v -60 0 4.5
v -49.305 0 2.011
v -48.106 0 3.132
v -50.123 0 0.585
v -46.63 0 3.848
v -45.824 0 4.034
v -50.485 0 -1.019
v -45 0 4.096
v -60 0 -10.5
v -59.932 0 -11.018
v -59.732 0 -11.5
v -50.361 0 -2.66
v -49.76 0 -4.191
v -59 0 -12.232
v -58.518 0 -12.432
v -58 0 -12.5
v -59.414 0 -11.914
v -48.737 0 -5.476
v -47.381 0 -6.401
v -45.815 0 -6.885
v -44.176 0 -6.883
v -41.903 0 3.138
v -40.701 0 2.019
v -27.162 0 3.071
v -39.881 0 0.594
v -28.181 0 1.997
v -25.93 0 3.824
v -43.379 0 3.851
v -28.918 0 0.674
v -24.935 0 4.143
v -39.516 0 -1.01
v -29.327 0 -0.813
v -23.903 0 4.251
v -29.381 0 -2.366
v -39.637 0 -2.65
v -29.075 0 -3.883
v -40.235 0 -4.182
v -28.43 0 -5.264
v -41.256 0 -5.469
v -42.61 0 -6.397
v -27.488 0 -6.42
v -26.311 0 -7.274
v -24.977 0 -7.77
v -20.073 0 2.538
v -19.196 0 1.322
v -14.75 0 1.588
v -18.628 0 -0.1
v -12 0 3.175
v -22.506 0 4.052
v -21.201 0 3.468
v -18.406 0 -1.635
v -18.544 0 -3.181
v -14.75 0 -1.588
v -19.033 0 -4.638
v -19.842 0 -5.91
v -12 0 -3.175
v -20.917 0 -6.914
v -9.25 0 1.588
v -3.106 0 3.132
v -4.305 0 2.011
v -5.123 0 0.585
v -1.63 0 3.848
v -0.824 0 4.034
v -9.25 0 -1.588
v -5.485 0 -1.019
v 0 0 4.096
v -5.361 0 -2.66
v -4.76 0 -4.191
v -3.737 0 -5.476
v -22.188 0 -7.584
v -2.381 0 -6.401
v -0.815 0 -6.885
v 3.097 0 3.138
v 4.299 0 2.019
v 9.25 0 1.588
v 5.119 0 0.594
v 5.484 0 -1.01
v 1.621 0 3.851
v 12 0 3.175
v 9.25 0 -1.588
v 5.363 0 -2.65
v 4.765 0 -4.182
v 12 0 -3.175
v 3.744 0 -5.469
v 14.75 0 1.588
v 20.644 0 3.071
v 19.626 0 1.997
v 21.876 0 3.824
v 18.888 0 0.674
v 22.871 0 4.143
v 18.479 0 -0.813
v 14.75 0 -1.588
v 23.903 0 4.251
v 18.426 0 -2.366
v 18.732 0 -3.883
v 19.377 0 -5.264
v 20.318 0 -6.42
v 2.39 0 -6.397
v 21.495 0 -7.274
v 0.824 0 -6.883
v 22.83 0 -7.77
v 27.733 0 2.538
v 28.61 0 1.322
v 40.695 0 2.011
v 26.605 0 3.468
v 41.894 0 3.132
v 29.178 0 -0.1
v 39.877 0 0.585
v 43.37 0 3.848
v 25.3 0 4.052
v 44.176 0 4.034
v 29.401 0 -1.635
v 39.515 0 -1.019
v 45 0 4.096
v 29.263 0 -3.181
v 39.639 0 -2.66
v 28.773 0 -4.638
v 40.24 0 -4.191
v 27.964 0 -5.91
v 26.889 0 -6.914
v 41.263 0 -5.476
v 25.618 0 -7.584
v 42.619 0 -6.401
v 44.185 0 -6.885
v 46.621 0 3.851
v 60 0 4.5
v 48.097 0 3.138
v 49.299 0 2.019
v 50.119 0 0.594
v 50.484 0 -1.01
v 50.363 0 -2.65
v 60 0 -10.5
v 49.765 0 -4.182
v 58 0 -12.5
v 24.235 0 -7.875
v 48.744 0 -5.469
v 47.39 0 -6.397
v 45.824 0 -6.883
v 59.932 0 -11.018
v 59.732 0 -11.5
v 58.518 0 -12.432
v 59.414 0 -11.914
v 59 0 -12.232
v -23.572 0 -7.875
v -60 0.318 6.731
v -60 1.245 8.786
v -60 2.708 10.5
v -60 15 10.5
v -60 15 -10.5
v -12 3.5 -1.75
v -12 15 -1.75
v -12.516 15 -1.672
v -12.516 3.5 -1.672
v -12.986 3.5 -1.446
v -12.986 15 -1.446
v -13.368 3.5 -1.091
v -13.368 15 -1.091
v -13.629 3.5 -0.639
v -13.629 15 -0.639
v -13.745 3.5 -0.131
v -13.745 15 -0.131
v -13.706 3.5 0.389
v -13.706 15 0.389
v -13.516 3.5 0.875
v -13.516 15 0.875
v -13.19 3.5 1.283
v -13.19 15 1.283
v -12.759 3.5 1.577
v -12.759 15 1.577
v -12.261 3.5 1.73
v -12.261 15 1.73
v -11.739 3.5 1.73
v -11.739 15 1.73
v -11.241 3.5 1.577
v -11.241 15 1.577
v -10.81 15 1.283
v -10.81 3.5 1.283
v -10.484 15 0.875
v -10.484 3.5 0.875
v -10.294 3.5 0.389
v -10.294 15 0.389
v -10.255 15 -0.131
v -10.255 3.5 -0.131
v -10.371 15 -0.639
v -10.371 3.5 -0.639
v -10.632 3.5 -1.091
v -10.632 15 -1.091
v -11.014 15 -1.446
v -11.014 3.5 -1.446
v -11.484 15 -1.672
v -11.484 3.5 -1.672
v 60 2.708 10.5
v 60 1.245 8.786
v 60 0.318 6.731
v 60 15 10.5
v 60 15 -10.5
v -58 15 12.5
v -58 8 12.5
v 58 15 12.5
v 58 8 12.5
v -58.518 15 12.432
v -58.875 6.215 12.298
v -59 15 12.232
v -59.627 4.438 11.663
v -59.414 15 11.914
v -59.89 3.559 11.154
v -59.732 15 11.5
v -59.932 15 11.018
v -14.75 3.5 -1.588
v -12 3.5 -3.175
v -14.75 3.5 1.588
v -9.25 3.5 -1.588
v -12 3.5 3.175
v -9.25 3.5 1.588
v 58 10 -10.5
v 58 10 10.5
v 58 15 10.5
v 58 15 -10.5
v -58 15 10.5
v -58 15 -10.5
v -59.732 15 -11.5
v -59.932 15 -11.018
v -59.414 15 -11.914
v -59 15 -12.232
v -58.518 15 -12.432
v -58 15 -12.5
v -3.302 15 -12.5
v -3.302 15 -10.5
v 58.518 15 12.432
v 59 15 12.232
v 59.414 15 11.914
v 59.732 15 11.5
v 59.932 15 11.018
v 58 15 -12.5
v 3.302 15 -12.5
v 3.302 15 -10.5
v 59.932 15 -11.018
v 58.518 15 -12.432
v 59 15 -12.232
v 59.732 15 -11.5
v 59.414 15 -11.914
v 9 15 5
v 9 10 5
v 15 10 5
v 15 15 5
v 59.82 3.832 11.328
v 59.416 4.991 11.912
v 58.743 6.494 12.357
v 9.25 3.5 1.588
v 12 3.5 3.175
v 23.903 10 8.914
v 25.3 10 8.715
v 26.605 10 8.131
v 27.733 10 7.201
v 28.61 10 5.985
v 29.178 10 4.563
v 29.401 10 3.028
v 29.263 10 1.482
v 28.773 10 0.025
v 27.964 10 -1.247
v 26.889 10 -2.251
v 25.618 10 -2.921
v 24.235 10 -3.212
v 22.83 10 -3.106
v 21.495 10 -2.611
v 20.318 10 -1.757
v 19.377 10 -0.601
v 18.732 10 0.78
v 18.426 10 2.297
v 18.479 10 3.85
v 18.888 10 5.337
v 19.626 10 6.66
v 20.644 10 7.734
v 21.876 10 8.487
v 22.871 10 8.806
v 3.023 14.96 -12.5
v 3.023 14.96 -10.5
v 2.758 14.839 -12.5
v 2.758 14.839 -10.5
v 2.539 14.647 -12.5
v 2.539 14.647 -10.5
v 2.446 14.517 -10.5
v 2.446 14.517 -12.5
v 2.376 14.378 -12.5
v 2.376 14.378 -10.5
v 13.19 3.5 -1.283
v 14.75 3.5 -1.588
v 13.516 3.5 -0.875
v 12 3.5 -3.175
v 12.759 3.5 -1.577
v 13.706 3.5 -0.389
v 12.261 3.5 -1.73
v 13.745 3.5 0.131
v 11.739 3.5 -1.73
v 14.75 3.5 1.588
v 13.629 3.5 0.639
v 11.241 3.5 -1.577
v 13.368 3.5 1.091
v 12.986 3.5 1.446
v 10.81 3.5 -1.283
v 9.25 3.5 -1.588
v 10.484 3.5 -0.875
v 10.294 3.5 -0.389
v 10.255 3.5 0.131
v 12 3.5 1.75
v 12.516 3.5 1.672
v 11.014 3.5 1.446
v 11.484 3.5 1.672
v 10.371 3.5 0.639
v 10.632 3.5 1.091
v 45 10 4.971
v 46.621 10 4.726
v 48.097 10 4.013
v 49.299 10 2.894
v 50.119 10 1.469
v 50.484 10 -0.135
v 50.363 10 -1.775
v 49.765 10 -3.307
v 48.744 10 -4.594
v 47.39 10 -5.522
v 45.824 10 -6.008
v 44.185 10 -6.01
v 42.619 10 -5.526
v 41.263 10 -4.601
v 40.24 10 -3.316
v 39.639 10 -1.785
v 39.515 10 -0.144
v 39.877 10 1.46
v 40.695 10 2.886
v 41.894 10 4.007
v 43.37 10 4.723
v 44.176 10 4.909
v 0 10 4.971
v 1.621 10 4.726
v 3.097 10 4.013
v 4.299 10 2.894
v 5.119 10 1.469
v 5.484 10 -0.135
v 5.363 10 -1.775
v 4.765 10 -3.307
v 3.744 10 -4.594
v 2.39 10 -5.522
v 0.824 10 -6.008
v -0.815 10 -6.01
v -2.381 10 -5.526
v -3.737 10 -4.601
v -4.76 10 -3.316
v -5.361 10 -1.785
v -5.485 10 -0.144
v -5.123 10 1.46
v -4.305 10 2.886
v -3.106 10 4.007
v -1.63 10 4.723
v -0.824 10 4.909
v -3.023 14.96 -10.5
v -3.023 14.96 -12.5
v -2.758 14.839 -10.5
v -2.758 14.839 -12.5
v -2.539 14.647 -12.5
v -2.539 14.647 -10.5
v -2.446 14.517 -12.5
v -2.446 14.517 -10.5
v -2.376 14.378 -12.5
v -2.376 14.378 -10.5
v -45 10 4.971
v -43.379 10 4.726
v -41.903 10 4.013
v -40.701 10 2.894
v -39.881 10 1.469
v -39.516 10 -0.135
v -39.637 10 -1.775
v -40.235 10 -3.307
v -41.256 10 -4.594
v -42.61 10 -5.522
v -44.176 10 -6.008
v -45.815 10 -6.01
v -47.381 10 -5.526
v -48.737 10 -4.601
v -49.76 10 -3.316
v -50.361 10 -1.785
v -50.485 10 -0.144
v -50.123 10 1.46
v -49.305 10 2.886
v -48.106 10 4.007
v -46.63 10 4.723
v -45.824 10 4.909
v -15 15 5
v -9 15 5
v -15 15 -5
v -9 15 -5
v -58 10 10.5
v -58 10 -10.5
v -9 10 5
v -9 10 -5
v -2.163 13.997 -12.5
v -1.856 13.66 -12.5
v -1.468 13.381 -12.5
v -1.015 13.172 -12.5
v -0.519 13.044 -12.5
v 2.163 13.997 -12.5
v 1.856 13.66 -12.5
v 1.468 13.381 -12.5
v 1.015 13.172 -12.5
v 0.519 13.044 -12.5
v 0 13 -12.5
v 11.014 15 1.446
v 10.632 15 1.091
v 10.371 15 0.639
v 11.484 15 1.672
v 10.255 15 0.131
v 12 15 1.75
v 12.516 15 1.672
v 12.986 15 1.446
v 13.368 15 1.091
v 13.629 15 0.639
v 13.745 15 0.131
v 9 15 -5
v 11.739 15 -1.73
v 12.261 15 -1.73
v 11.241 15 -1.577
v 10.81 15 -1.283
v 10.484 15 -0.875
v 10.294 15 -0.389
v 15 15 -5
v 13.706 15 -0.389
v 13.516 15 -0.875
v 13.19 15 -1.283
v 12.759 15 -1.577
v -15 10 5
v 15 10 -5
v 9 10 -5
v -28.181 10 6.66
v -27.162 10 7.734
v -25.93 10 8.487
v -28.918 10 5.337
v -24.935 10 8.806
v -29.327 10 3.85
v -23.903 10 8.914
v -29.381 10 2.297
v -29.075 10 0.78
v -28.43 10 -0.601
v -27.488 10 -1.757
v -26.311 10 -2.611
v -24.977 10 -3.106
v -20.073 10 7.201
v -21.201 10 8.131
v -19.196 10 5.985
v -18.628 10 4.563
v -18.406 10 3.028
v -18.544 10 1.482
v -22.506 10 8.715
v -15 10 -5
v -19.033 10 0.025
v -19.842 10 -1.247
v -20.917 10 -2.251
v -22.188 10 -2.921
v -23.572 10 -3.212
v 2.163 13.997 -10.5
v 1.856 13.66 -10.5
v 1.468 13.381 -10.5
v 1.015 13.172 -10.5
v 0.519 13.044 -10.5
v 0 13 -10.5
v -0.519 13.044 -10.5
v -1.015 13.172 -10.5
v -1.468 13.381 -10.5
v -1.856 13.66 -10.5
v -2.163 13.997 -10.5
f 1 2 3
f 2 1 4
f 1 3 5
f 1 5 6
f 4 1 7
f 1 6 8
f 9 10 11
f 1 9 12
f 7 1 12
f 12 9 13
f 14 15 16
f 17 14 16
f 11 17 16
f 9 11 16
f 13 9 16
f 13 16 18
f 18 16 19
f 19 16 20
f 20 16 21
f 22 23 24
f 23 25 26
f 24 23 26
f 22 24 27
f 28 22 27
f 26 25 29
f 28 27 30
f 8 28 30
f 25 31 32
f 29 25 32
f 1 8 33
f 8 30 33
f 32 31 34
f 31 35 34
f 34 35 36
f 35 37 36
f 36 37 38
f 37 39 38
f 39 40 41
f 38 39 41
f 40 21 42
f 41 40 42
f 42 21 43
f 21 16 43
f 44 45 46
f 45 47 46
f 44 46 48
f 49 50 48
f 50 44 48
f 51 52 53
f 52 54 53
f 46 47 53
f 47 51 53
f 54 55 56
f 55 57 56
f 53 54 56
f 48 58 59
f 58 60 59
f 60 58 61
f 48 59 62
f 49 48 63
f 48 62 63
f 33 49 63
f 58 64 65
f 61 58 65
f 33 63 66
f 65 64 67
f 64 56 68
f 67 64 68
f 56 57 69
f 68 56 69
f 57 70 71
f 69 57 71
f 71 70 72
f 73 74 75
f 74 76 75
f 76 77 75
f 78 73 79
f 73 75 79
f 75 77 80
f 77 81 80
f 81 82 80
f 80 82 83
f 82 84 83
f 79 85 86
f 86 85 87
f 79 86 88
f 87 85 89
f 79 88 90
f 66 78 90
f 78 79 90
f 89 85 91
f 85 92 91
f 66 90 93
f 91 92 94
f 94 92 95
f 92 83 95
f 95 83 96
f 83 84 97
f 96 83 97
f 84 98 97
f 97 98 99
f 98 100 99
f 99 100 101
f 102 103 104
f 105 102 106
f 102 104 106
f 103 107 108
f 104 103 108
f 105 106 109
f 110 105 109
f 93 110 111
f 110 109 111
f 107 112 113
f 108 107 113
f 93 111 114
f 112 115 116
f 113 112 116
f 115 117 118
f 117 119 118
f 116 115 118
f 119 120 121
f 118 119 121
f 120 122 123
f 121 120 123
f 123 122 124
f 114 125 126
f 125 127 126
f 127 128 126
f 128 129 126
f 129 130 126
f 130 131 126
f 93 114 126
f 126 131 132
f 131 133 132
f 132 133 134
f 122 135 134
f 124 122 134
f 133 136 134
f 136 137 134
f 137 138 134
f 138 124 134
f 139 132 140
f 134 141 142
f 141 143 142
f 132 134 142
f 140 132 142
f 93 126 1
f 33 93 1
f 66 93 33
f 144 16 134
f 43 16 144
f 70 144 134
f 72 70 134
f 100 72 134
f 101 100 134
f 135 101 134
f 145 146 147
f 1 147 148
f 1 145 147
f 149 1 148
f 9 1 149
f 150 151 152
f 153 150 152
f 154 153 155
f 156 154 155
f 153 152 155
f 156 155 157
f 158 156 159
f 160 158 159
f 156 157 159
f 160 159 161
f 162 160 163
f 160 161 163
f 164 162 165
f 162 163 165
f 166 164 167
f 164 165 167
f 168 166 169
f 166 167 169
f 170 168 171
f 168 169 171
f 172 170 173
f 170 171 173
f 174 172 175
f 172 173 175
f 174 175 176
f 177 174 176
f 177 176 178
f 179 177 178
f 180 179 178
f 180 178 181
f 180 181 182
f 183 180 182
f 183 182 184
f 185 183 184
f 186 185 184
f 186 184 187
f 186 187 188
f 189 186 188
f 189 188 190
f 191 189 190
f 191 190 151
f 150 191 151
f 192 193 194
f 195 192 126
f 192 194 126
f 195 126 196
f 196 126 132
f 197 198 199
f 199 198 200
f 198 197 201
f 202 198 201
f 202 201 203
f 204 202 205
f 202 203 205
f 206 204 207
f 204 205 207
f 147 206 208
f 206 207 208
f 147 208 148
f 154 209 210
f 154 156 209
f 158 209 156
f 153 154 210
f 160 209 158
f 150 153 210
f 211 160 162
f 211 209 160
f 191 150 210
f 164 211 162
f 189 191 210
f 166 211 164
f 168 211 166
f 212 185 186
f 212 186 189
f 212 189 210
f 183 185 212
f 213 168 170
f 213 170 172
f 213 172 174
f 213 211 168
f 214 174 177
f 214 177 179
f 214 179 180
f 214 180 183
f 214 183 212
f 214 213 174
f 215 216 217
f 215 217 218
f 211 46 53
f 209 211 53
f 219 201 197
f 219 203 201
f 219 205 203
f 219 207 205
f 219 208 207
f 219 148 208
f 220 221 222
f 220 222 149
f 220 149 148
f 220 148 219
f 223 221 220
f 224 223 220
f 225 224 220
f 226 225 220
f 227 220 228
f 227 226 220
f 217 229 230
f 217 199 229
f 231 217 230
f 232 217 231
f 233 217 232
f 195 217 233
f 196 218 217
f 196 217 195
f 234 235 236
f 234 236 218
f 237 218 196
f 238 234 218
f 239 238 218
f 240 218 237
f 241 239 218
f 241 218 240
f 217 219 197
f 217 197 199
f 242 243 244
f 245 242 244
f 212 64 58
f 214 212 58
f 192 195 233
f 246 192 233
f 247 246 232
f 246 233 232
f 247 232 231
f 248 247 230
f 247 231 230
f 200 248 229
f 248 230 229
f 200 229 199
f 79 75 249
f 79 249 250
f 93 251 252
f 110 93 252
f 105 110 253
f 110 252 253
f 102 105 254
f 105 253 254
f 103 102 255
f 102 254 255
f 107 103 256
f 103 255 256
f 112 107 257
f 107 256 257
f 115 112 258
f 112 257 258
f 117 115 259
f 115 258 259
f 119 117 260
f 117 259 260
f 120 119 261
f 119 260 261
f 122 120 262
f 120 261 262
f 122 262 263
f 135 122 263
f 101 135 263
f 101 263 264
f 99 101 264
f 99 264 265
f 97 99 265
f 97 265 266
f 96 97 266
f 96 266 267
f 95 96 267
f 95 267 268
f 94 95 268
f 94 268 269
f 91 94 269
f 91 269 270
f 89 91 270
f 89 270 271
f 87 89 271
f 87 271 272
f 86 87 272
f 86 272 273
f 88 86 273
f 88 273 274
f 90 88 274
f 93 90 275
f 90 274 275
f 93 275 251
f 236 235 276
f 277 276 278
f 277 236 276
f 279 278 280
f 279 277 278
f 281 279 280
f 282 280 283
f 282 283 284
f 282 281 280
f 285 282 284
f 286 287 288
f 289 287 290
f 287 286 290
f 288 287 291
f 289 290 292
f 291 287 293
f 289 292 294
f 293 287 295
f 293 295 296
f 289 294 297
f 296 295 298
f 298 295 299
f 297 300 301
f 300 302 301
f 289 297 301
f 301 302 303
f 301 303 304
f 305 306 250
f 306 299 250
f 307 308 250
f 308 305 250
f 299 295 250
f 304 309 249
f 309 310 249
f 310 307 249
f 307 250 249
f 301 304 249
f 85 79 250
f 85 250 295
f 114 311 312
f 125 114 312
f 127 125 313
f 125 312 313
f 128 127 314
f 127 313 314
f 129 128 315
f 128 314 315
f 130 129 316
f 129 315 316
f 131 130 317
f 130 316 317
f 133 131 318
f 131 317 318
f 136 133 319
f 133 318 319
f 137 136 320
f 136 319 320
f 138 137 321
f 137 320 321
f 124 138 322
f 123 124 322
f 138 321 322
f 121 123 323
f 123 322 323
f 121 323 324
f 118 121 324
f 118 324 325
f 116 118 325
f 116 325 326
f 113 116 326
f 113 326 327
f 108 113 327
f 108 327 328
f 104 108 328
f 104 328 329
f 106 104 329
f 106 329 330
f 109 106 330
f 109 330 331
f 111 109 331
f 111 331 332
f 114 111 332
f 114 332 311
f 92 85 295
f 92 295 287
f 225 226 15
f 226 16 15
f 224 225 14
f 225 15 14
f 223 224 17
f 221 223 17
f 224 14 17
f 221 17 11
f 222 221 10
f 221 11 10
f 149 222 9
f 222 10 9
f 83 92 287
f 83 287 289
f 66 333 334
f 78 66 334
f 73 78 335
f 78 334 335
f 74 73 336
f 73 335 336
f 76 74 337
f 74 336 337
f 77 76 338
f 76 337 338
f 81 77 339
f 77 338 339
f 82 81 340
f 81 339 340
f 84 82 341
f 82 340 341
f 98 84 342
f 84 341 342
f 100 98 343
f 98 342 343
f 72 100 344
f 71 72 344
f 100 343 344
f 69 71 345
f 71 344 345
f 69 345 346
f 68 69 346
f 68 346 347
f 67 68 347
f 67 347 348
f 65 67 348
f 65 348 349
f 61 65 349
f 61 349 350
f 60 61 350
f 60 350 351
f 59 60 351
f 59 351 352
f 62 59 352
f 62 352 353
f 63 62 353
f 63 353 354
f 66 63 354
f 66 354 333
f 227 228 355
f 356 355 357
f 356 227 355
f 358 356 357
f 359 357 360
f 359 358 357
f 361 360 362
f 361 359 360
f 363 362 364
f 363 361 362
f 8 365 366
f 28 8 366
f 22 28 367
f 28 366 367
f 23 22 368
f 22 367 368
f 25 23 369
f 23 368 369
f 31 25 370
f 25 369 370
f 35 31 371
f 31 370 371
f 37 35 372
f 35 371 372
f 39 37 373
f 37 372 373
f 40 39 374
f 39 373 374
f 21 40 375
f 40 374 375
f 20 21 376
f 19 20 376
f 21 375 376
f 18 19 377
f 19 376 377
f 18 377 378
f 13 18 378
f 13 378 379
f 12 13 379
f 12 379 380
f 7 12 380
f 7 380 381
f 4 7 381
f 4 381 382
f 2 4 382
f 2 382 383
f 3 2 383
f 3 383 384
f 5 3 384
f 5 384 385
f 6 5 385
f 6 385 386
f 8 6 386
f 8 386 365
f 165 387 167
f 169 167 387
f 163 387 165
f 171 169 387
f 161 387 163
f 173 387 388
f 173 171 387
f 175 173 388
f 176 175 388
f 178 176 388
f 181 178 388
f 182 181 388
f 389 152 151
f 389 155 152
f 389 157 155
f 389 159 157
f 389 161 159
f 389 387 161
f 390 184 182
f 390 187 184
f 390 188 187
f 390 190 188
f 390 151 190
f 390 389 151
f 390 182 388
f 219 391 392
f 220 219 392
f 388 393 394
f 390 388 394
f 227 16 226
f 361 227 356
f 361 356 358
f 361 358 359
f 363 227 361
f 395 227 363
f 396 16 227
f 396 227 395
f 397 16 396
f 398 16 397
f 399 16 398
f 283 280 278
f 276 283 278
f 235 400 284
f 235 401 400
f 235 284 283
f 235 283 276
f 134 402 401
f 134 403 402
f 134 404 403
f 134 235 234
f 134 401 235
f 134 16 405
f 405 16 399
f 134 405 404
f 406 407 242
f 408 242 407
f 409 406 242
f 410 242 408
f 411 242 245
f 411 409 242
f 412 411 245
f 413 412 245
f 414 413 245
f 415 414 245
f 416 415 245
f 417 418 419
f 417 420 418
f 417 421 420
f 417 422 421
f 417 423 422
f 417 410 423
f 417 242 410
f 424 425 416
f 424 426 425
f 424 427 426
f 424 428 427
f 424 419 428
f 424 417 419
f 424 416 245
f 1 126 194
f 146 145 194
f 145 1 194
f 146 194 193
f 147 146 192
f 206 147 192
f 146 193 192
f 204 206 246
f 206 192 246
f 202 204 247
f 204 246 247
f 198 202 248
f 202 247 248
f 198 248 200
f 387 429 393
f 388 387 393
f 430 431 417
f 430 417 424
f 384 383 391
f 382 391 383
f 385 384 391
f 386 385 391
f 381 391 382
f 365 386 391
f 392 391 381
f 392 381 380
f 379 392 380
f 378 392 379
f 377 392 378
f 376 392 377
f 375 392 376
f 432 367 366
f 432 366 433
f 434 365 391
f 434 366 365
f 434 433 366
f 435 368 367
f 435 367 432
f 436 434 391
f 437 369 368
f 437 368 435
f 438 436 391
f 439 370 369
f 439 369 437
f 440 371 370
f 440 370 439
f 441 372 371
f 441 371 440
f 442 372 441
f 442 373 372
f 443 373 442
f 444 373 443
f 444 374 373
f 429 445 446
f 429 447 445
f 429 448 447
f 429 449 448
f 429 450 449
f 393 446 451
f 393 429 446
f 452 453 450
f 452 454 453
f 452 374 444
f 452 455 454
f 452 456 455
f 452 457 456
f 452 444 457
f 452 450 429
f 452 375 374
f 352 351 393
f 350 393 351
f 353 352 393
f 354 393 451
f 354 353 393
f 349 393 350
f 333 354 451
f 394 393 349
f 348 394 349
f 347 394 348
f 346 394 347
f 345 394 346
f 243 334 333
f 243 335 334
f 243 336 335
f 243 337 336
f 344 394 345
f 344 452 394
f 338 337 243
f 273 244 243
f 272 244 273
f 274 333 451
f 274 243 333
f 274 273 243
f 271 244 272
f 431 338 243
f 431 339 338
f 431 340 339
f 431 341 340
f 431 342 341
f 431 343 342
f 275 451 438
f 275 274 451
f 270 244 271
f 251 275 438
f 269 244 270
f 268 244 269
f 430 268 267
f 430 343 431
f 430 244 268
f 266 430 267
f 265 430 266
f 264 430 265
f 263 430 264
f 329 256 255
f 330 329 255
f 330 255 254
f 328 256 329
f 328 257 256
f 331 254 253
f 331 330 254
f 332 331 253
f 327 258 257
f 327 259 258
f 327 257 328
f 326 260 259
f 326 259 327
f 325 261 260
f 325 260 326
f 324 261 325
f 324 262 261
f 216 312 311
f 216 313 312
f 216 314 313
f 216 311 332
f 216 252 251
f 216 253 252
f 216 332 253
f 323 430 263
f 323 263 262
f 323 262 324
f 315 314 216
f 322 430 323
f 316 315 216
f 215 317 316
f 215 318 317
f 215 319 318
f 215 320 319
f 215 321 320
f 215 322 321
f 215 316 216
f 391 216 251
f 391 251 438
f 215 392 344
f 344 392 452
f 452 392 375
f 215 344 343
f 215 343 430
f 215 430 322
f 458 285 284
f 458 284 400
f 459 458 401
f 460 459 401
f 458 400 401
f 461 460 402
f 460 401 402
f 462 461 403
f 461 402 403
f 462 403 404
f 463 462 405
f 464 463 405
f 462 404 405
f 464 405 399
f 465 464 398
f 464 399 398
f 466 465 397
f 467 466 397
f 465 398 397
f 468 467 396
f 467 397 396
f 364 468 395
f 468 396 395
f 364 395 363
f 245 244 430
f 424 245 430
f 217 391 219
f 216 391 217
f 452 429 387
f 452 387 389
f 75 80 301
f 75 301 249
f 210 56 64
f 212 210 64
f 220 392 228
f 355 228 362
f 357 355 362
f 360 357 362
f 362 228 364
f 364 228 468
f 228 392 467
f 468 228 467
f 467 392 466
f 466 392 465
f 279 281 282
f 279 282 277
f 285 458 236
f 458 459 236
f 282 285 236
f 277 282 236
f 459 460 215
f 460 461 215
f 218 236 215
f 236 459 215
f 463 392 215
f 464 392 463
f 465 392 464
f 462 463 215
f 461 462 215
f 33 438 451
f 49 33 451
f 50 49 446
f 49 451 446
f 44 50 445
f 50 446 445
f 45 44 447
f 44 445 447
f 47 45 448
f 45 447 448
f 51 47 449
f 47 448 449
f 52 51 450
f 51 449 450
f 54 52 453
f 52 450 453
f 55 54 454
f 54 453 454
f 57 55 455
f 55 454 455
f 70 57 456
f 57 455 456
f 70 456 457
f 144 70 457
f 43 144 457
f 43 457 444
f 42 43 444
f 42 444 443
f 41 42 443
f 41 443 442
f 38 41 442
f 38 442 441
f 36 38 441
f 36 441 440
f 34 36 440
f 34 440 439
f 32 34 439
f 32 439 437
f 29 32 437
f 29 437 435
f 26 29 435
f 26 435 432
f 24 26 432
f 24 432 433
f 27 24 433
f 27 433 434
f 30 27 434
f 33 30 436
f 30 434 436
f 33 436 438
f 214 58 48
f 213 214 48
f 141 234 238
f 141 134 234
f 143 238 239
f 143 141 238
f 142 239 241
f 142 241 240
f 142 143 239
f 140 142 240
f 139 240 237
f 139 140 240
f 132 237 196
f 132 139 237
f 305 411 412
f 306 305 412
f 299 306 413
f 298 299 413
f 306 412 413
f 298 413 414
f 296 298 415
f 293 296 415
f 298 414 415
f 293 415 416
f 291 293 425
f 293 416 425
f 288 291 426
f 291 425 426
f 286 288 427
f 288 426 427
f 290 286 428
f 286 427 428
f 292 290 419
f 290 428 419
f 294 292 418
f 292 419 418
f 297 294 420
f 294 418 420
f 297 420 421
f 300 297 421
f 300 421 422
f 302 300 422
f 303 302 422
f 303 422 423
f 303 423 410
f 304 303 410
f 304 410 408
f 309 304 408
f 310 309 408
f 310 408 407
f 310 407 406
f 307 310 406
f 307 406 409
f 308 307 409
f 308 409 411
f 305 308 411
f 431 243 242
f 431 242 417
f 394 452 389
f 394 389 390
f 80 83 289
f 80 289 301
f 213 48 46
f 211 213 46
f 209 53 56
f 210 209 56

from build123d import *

# Parameters (mm, degrees)
BASE_W                 = 120
BASE_H                 = 25
BASE_EXT_DEPTH         = 10
SKETCH3_R              = 5.5
LED_BOTTOM_CUT_DEPTH   = 63.469697574
LED_FOR_TOP_ROW_R      = 5.5
LED_TOP_CUT_DEPTH      = 65.13752525
SKETCH5_W              = 120
SKETCH5_H              = 25
SKETCH5_W_2            = 116
SKETCH5_H_2            = 21
WIRE_BOX_RIM_DEPTH     = 5
SKETCH6_W              = 6
SKETCH6_H              = 10
SUPPORT_SPACERS_DEPTH  = 5
SKETCH8_R              = 1.75
M3_SCREW_CUT_DEPTH     = 64.097147321
M3_NUT_CUT_DEPTH       = 3.5
WIRE_CUT_OUT_RX        = 2.5
WIRE_CUT_OUT_RY        = 2
WIRE_CUT_OUT_CUT_DEPTH = 2
FILLET1_R              = 1
FILLET2_R              = 1
FILLET3_R              = 2
FILLET4_R              = 2
FILLET5_R              = 2
FILLET6_R              = 2
FILLET7_R              = 8


with BuildPart() as part:
    # Base → Base EXT (new body)
    with BuildSketch(Plane(origin=(0, 0, 0), x_dir=(1, 0, 0), z_dir=(0, 1, 0))):
        Rectangle(BASE_W, BASE_H)
    extrude(amount=BASE_EXT_DEPTH)

    # Sketch3 → LED bottom CUT (cut, through all)
    with BuildSketch(Plane(origin=(0, 11.009339875, 0.963192432), x_dir=(1, 0, 0), z_dir=(0, 0.9961946980917455, 0.08715574274765836))):
        with Locations(Location((-45, 1.419123701, 0), (0, 0, 270))):
            Circle(SKETCH3_R)
        with Locations(Location((0, 1.419123701, 0), (0, 0, 270))):
            Circle(SKETCH3_R)
        with Locations(Location((45, 1.419123701, 0), (0, 0, 270))):
            Circle(SKETCH3_R)
    extrude(amount=-LED_BOTTOM_CUT_DEPTH, mode=Mode.SUBTRACT)

    # LED for Top Row → LED top CUT (cut, through all)
    with BuildSketch(Plane(origin=(0, 13.001715818, 6.062799655), x_dir=(1, 0, 0), z_dir=(0, 0.9063077870366496, 0.4226182617407003))):
        with Locations(Location((-23.903258736, 1.647335279, 0), (0, 0, 270))):
            Circle(LED_FOR_TOP_ROW_R)
        with Locations(Location((23.903258736, 1.647335279, 0), (0, 0, 270))):
            Circle(LED_FOR_TOP_ROW_R)
    extrude(amount=-LED_TOP_CUT_DEPTH, mode=Mode.SUBTRACT)

    # Sketch5 → Wire Box Rim (add)
    with BuildSketch(Plane(origin=(0, 10, 0), x_dir=(1, 0, 0), z_dir=(0, 1, 0))):
        Rectangle(SKETCH5_W, SKETCH5_H)
        Rectangle(SKETCH5_W_2, SKETCH5_H_2, mode=Mode.SUBTRACT)
    extrude(amount=WIRE_BOX_RIM_DEPTH)

    # Sketch6 → Support Spacers (add)
    with BuildSketch(Plane(origin=(0, 10, 0), x_dir=(1, 0, 0), z_dir=(0, 1, 0))):
        with Locations((-12, 0)):
            Rectangle(SKETCH6_W, SKETCH6_H)
        with Locations((12, 0)):
            Rectangle(SKETCH6_W, SKETCH6_H)
    extrude(amount=SUPPORT_SPACERS_DEPTH)

    # Sketch8 → M3 Screw CUT (cut, through all)
    with BuildSketch(Plane(origin=(0, 15, 0), x_dir=(1, 0, 0), z_dir=(0, 1, 0))):
        with Locations(Location((12, 0, 0), (0, 0, 270))):
            Circle(SKETCH8_R)
        with Locations(Location((-12, 0, 0), (0, 0, 90))):
            Circle(SKETCH8_R)
    extrude(amount=-M3_SCREW_CUT_DEPTH, mode=Mode.SUBTRACT)

    # M3 Nut → M3 Nut CUT (cut)
    with BuildSketch(Plane.XZ):
        Polygon((-12, 3.175426481), (-14.75, 1.58771324), (-14.75, -1.58771324), (-12, -3.175426481), (-9.25, -1.58771324), (-9.25, 1.58771324), align=None)
        Polygon((9.25, 1.58771324), (12, 3.175426481), (14.75, 1.58771324), (14.75, -1.58771324), (12, -3.175426481), (9.25, -1.58771324), align=None)
    extrude(amount=-M3_NUT_CUT_DEPTH, mode=Mode.SUBTRACT)

    # Wire cut out → Wire cut out CUT (cut)
    with BuildSketch(Plane(origin=(0, 0, -12.5), x_dir=(-1, 0, 0), z_dir=(0, 0, -1))):
        with Locations(Location((0, 15), (0, 0, 180))):
            Ellipse(WIRE_CUT_OUT_RX, WIRE_CUT_OUT_RY)
    extrude(amount=-WIRE_CUT_OUT_CUT_DEPTH, mode=Mode.SUBTRACT)

    # Fillet1
    fillet1_edges = [part.edges().sort_by_distance(p)[0] for p in [
        (2.5, 15, -11.5),
    ]]
    fillet(fillet1_edges, radius=FILLET1_R)

    # Fillet2
    fillet2_edges = [part.edges().sort_by_distance(p)[0] for p in [
        (-2.5, 15, -11.5),
    ]]
    fillet(fillet2_edges, radius=FILLET2_R)

    # Fillet3
    fillet3_edges = [part.edges().sort_by_distance(p)[0] for p in [
        (-60, 7.5, -12.5),
    ]]
    fillet(fillet3_edges, radius=FILLET3_R)

    # Fillet4
    fillet4_edges = [part.edges().sort_by_distance(p)[0] for p in [
        (60, 7.5, -12.5),
    ]]
    fillet(fillet4_edges, radius=FILLET4_R)

    # Fillet5
    fillet5_edges = [part.edges().sort_by_distance(p)[0] for p in [
        (60, 7.5, 12.5),
    ]]
    fillet(fillet5_edges, radius=FILLET5_R)

    # Fillet6
    fillet6_edges = [part.edges().sort_by_distance(p)[0] for p in [
        (-60, 7.5, 12.5),
    ]]
    fillet(fillet6_edges, radius=FILLET6_R)

    # Fillet7
    # the kernel refuses this fillet: 8 mm, written as the material it takes off along each edge
    with BuildSketch(Plane(origin=(78, 0, 12.5), x_dir=(0, 1, 0), z_dir=(-1, 0, 0))) as fillet7_piece_1:
        with BuildLine():
            CenterArc((FILLET7_R, FILLET7_R), FILLET7_R, 180, 90)
            Line((0, FILLET7_R), (0, 0))
            Line((0, 0), (FILLET7_R, 0))
        make_face()
    extrude(amount=156, mode=Mode.SUBTRACT)


solid = part.part
